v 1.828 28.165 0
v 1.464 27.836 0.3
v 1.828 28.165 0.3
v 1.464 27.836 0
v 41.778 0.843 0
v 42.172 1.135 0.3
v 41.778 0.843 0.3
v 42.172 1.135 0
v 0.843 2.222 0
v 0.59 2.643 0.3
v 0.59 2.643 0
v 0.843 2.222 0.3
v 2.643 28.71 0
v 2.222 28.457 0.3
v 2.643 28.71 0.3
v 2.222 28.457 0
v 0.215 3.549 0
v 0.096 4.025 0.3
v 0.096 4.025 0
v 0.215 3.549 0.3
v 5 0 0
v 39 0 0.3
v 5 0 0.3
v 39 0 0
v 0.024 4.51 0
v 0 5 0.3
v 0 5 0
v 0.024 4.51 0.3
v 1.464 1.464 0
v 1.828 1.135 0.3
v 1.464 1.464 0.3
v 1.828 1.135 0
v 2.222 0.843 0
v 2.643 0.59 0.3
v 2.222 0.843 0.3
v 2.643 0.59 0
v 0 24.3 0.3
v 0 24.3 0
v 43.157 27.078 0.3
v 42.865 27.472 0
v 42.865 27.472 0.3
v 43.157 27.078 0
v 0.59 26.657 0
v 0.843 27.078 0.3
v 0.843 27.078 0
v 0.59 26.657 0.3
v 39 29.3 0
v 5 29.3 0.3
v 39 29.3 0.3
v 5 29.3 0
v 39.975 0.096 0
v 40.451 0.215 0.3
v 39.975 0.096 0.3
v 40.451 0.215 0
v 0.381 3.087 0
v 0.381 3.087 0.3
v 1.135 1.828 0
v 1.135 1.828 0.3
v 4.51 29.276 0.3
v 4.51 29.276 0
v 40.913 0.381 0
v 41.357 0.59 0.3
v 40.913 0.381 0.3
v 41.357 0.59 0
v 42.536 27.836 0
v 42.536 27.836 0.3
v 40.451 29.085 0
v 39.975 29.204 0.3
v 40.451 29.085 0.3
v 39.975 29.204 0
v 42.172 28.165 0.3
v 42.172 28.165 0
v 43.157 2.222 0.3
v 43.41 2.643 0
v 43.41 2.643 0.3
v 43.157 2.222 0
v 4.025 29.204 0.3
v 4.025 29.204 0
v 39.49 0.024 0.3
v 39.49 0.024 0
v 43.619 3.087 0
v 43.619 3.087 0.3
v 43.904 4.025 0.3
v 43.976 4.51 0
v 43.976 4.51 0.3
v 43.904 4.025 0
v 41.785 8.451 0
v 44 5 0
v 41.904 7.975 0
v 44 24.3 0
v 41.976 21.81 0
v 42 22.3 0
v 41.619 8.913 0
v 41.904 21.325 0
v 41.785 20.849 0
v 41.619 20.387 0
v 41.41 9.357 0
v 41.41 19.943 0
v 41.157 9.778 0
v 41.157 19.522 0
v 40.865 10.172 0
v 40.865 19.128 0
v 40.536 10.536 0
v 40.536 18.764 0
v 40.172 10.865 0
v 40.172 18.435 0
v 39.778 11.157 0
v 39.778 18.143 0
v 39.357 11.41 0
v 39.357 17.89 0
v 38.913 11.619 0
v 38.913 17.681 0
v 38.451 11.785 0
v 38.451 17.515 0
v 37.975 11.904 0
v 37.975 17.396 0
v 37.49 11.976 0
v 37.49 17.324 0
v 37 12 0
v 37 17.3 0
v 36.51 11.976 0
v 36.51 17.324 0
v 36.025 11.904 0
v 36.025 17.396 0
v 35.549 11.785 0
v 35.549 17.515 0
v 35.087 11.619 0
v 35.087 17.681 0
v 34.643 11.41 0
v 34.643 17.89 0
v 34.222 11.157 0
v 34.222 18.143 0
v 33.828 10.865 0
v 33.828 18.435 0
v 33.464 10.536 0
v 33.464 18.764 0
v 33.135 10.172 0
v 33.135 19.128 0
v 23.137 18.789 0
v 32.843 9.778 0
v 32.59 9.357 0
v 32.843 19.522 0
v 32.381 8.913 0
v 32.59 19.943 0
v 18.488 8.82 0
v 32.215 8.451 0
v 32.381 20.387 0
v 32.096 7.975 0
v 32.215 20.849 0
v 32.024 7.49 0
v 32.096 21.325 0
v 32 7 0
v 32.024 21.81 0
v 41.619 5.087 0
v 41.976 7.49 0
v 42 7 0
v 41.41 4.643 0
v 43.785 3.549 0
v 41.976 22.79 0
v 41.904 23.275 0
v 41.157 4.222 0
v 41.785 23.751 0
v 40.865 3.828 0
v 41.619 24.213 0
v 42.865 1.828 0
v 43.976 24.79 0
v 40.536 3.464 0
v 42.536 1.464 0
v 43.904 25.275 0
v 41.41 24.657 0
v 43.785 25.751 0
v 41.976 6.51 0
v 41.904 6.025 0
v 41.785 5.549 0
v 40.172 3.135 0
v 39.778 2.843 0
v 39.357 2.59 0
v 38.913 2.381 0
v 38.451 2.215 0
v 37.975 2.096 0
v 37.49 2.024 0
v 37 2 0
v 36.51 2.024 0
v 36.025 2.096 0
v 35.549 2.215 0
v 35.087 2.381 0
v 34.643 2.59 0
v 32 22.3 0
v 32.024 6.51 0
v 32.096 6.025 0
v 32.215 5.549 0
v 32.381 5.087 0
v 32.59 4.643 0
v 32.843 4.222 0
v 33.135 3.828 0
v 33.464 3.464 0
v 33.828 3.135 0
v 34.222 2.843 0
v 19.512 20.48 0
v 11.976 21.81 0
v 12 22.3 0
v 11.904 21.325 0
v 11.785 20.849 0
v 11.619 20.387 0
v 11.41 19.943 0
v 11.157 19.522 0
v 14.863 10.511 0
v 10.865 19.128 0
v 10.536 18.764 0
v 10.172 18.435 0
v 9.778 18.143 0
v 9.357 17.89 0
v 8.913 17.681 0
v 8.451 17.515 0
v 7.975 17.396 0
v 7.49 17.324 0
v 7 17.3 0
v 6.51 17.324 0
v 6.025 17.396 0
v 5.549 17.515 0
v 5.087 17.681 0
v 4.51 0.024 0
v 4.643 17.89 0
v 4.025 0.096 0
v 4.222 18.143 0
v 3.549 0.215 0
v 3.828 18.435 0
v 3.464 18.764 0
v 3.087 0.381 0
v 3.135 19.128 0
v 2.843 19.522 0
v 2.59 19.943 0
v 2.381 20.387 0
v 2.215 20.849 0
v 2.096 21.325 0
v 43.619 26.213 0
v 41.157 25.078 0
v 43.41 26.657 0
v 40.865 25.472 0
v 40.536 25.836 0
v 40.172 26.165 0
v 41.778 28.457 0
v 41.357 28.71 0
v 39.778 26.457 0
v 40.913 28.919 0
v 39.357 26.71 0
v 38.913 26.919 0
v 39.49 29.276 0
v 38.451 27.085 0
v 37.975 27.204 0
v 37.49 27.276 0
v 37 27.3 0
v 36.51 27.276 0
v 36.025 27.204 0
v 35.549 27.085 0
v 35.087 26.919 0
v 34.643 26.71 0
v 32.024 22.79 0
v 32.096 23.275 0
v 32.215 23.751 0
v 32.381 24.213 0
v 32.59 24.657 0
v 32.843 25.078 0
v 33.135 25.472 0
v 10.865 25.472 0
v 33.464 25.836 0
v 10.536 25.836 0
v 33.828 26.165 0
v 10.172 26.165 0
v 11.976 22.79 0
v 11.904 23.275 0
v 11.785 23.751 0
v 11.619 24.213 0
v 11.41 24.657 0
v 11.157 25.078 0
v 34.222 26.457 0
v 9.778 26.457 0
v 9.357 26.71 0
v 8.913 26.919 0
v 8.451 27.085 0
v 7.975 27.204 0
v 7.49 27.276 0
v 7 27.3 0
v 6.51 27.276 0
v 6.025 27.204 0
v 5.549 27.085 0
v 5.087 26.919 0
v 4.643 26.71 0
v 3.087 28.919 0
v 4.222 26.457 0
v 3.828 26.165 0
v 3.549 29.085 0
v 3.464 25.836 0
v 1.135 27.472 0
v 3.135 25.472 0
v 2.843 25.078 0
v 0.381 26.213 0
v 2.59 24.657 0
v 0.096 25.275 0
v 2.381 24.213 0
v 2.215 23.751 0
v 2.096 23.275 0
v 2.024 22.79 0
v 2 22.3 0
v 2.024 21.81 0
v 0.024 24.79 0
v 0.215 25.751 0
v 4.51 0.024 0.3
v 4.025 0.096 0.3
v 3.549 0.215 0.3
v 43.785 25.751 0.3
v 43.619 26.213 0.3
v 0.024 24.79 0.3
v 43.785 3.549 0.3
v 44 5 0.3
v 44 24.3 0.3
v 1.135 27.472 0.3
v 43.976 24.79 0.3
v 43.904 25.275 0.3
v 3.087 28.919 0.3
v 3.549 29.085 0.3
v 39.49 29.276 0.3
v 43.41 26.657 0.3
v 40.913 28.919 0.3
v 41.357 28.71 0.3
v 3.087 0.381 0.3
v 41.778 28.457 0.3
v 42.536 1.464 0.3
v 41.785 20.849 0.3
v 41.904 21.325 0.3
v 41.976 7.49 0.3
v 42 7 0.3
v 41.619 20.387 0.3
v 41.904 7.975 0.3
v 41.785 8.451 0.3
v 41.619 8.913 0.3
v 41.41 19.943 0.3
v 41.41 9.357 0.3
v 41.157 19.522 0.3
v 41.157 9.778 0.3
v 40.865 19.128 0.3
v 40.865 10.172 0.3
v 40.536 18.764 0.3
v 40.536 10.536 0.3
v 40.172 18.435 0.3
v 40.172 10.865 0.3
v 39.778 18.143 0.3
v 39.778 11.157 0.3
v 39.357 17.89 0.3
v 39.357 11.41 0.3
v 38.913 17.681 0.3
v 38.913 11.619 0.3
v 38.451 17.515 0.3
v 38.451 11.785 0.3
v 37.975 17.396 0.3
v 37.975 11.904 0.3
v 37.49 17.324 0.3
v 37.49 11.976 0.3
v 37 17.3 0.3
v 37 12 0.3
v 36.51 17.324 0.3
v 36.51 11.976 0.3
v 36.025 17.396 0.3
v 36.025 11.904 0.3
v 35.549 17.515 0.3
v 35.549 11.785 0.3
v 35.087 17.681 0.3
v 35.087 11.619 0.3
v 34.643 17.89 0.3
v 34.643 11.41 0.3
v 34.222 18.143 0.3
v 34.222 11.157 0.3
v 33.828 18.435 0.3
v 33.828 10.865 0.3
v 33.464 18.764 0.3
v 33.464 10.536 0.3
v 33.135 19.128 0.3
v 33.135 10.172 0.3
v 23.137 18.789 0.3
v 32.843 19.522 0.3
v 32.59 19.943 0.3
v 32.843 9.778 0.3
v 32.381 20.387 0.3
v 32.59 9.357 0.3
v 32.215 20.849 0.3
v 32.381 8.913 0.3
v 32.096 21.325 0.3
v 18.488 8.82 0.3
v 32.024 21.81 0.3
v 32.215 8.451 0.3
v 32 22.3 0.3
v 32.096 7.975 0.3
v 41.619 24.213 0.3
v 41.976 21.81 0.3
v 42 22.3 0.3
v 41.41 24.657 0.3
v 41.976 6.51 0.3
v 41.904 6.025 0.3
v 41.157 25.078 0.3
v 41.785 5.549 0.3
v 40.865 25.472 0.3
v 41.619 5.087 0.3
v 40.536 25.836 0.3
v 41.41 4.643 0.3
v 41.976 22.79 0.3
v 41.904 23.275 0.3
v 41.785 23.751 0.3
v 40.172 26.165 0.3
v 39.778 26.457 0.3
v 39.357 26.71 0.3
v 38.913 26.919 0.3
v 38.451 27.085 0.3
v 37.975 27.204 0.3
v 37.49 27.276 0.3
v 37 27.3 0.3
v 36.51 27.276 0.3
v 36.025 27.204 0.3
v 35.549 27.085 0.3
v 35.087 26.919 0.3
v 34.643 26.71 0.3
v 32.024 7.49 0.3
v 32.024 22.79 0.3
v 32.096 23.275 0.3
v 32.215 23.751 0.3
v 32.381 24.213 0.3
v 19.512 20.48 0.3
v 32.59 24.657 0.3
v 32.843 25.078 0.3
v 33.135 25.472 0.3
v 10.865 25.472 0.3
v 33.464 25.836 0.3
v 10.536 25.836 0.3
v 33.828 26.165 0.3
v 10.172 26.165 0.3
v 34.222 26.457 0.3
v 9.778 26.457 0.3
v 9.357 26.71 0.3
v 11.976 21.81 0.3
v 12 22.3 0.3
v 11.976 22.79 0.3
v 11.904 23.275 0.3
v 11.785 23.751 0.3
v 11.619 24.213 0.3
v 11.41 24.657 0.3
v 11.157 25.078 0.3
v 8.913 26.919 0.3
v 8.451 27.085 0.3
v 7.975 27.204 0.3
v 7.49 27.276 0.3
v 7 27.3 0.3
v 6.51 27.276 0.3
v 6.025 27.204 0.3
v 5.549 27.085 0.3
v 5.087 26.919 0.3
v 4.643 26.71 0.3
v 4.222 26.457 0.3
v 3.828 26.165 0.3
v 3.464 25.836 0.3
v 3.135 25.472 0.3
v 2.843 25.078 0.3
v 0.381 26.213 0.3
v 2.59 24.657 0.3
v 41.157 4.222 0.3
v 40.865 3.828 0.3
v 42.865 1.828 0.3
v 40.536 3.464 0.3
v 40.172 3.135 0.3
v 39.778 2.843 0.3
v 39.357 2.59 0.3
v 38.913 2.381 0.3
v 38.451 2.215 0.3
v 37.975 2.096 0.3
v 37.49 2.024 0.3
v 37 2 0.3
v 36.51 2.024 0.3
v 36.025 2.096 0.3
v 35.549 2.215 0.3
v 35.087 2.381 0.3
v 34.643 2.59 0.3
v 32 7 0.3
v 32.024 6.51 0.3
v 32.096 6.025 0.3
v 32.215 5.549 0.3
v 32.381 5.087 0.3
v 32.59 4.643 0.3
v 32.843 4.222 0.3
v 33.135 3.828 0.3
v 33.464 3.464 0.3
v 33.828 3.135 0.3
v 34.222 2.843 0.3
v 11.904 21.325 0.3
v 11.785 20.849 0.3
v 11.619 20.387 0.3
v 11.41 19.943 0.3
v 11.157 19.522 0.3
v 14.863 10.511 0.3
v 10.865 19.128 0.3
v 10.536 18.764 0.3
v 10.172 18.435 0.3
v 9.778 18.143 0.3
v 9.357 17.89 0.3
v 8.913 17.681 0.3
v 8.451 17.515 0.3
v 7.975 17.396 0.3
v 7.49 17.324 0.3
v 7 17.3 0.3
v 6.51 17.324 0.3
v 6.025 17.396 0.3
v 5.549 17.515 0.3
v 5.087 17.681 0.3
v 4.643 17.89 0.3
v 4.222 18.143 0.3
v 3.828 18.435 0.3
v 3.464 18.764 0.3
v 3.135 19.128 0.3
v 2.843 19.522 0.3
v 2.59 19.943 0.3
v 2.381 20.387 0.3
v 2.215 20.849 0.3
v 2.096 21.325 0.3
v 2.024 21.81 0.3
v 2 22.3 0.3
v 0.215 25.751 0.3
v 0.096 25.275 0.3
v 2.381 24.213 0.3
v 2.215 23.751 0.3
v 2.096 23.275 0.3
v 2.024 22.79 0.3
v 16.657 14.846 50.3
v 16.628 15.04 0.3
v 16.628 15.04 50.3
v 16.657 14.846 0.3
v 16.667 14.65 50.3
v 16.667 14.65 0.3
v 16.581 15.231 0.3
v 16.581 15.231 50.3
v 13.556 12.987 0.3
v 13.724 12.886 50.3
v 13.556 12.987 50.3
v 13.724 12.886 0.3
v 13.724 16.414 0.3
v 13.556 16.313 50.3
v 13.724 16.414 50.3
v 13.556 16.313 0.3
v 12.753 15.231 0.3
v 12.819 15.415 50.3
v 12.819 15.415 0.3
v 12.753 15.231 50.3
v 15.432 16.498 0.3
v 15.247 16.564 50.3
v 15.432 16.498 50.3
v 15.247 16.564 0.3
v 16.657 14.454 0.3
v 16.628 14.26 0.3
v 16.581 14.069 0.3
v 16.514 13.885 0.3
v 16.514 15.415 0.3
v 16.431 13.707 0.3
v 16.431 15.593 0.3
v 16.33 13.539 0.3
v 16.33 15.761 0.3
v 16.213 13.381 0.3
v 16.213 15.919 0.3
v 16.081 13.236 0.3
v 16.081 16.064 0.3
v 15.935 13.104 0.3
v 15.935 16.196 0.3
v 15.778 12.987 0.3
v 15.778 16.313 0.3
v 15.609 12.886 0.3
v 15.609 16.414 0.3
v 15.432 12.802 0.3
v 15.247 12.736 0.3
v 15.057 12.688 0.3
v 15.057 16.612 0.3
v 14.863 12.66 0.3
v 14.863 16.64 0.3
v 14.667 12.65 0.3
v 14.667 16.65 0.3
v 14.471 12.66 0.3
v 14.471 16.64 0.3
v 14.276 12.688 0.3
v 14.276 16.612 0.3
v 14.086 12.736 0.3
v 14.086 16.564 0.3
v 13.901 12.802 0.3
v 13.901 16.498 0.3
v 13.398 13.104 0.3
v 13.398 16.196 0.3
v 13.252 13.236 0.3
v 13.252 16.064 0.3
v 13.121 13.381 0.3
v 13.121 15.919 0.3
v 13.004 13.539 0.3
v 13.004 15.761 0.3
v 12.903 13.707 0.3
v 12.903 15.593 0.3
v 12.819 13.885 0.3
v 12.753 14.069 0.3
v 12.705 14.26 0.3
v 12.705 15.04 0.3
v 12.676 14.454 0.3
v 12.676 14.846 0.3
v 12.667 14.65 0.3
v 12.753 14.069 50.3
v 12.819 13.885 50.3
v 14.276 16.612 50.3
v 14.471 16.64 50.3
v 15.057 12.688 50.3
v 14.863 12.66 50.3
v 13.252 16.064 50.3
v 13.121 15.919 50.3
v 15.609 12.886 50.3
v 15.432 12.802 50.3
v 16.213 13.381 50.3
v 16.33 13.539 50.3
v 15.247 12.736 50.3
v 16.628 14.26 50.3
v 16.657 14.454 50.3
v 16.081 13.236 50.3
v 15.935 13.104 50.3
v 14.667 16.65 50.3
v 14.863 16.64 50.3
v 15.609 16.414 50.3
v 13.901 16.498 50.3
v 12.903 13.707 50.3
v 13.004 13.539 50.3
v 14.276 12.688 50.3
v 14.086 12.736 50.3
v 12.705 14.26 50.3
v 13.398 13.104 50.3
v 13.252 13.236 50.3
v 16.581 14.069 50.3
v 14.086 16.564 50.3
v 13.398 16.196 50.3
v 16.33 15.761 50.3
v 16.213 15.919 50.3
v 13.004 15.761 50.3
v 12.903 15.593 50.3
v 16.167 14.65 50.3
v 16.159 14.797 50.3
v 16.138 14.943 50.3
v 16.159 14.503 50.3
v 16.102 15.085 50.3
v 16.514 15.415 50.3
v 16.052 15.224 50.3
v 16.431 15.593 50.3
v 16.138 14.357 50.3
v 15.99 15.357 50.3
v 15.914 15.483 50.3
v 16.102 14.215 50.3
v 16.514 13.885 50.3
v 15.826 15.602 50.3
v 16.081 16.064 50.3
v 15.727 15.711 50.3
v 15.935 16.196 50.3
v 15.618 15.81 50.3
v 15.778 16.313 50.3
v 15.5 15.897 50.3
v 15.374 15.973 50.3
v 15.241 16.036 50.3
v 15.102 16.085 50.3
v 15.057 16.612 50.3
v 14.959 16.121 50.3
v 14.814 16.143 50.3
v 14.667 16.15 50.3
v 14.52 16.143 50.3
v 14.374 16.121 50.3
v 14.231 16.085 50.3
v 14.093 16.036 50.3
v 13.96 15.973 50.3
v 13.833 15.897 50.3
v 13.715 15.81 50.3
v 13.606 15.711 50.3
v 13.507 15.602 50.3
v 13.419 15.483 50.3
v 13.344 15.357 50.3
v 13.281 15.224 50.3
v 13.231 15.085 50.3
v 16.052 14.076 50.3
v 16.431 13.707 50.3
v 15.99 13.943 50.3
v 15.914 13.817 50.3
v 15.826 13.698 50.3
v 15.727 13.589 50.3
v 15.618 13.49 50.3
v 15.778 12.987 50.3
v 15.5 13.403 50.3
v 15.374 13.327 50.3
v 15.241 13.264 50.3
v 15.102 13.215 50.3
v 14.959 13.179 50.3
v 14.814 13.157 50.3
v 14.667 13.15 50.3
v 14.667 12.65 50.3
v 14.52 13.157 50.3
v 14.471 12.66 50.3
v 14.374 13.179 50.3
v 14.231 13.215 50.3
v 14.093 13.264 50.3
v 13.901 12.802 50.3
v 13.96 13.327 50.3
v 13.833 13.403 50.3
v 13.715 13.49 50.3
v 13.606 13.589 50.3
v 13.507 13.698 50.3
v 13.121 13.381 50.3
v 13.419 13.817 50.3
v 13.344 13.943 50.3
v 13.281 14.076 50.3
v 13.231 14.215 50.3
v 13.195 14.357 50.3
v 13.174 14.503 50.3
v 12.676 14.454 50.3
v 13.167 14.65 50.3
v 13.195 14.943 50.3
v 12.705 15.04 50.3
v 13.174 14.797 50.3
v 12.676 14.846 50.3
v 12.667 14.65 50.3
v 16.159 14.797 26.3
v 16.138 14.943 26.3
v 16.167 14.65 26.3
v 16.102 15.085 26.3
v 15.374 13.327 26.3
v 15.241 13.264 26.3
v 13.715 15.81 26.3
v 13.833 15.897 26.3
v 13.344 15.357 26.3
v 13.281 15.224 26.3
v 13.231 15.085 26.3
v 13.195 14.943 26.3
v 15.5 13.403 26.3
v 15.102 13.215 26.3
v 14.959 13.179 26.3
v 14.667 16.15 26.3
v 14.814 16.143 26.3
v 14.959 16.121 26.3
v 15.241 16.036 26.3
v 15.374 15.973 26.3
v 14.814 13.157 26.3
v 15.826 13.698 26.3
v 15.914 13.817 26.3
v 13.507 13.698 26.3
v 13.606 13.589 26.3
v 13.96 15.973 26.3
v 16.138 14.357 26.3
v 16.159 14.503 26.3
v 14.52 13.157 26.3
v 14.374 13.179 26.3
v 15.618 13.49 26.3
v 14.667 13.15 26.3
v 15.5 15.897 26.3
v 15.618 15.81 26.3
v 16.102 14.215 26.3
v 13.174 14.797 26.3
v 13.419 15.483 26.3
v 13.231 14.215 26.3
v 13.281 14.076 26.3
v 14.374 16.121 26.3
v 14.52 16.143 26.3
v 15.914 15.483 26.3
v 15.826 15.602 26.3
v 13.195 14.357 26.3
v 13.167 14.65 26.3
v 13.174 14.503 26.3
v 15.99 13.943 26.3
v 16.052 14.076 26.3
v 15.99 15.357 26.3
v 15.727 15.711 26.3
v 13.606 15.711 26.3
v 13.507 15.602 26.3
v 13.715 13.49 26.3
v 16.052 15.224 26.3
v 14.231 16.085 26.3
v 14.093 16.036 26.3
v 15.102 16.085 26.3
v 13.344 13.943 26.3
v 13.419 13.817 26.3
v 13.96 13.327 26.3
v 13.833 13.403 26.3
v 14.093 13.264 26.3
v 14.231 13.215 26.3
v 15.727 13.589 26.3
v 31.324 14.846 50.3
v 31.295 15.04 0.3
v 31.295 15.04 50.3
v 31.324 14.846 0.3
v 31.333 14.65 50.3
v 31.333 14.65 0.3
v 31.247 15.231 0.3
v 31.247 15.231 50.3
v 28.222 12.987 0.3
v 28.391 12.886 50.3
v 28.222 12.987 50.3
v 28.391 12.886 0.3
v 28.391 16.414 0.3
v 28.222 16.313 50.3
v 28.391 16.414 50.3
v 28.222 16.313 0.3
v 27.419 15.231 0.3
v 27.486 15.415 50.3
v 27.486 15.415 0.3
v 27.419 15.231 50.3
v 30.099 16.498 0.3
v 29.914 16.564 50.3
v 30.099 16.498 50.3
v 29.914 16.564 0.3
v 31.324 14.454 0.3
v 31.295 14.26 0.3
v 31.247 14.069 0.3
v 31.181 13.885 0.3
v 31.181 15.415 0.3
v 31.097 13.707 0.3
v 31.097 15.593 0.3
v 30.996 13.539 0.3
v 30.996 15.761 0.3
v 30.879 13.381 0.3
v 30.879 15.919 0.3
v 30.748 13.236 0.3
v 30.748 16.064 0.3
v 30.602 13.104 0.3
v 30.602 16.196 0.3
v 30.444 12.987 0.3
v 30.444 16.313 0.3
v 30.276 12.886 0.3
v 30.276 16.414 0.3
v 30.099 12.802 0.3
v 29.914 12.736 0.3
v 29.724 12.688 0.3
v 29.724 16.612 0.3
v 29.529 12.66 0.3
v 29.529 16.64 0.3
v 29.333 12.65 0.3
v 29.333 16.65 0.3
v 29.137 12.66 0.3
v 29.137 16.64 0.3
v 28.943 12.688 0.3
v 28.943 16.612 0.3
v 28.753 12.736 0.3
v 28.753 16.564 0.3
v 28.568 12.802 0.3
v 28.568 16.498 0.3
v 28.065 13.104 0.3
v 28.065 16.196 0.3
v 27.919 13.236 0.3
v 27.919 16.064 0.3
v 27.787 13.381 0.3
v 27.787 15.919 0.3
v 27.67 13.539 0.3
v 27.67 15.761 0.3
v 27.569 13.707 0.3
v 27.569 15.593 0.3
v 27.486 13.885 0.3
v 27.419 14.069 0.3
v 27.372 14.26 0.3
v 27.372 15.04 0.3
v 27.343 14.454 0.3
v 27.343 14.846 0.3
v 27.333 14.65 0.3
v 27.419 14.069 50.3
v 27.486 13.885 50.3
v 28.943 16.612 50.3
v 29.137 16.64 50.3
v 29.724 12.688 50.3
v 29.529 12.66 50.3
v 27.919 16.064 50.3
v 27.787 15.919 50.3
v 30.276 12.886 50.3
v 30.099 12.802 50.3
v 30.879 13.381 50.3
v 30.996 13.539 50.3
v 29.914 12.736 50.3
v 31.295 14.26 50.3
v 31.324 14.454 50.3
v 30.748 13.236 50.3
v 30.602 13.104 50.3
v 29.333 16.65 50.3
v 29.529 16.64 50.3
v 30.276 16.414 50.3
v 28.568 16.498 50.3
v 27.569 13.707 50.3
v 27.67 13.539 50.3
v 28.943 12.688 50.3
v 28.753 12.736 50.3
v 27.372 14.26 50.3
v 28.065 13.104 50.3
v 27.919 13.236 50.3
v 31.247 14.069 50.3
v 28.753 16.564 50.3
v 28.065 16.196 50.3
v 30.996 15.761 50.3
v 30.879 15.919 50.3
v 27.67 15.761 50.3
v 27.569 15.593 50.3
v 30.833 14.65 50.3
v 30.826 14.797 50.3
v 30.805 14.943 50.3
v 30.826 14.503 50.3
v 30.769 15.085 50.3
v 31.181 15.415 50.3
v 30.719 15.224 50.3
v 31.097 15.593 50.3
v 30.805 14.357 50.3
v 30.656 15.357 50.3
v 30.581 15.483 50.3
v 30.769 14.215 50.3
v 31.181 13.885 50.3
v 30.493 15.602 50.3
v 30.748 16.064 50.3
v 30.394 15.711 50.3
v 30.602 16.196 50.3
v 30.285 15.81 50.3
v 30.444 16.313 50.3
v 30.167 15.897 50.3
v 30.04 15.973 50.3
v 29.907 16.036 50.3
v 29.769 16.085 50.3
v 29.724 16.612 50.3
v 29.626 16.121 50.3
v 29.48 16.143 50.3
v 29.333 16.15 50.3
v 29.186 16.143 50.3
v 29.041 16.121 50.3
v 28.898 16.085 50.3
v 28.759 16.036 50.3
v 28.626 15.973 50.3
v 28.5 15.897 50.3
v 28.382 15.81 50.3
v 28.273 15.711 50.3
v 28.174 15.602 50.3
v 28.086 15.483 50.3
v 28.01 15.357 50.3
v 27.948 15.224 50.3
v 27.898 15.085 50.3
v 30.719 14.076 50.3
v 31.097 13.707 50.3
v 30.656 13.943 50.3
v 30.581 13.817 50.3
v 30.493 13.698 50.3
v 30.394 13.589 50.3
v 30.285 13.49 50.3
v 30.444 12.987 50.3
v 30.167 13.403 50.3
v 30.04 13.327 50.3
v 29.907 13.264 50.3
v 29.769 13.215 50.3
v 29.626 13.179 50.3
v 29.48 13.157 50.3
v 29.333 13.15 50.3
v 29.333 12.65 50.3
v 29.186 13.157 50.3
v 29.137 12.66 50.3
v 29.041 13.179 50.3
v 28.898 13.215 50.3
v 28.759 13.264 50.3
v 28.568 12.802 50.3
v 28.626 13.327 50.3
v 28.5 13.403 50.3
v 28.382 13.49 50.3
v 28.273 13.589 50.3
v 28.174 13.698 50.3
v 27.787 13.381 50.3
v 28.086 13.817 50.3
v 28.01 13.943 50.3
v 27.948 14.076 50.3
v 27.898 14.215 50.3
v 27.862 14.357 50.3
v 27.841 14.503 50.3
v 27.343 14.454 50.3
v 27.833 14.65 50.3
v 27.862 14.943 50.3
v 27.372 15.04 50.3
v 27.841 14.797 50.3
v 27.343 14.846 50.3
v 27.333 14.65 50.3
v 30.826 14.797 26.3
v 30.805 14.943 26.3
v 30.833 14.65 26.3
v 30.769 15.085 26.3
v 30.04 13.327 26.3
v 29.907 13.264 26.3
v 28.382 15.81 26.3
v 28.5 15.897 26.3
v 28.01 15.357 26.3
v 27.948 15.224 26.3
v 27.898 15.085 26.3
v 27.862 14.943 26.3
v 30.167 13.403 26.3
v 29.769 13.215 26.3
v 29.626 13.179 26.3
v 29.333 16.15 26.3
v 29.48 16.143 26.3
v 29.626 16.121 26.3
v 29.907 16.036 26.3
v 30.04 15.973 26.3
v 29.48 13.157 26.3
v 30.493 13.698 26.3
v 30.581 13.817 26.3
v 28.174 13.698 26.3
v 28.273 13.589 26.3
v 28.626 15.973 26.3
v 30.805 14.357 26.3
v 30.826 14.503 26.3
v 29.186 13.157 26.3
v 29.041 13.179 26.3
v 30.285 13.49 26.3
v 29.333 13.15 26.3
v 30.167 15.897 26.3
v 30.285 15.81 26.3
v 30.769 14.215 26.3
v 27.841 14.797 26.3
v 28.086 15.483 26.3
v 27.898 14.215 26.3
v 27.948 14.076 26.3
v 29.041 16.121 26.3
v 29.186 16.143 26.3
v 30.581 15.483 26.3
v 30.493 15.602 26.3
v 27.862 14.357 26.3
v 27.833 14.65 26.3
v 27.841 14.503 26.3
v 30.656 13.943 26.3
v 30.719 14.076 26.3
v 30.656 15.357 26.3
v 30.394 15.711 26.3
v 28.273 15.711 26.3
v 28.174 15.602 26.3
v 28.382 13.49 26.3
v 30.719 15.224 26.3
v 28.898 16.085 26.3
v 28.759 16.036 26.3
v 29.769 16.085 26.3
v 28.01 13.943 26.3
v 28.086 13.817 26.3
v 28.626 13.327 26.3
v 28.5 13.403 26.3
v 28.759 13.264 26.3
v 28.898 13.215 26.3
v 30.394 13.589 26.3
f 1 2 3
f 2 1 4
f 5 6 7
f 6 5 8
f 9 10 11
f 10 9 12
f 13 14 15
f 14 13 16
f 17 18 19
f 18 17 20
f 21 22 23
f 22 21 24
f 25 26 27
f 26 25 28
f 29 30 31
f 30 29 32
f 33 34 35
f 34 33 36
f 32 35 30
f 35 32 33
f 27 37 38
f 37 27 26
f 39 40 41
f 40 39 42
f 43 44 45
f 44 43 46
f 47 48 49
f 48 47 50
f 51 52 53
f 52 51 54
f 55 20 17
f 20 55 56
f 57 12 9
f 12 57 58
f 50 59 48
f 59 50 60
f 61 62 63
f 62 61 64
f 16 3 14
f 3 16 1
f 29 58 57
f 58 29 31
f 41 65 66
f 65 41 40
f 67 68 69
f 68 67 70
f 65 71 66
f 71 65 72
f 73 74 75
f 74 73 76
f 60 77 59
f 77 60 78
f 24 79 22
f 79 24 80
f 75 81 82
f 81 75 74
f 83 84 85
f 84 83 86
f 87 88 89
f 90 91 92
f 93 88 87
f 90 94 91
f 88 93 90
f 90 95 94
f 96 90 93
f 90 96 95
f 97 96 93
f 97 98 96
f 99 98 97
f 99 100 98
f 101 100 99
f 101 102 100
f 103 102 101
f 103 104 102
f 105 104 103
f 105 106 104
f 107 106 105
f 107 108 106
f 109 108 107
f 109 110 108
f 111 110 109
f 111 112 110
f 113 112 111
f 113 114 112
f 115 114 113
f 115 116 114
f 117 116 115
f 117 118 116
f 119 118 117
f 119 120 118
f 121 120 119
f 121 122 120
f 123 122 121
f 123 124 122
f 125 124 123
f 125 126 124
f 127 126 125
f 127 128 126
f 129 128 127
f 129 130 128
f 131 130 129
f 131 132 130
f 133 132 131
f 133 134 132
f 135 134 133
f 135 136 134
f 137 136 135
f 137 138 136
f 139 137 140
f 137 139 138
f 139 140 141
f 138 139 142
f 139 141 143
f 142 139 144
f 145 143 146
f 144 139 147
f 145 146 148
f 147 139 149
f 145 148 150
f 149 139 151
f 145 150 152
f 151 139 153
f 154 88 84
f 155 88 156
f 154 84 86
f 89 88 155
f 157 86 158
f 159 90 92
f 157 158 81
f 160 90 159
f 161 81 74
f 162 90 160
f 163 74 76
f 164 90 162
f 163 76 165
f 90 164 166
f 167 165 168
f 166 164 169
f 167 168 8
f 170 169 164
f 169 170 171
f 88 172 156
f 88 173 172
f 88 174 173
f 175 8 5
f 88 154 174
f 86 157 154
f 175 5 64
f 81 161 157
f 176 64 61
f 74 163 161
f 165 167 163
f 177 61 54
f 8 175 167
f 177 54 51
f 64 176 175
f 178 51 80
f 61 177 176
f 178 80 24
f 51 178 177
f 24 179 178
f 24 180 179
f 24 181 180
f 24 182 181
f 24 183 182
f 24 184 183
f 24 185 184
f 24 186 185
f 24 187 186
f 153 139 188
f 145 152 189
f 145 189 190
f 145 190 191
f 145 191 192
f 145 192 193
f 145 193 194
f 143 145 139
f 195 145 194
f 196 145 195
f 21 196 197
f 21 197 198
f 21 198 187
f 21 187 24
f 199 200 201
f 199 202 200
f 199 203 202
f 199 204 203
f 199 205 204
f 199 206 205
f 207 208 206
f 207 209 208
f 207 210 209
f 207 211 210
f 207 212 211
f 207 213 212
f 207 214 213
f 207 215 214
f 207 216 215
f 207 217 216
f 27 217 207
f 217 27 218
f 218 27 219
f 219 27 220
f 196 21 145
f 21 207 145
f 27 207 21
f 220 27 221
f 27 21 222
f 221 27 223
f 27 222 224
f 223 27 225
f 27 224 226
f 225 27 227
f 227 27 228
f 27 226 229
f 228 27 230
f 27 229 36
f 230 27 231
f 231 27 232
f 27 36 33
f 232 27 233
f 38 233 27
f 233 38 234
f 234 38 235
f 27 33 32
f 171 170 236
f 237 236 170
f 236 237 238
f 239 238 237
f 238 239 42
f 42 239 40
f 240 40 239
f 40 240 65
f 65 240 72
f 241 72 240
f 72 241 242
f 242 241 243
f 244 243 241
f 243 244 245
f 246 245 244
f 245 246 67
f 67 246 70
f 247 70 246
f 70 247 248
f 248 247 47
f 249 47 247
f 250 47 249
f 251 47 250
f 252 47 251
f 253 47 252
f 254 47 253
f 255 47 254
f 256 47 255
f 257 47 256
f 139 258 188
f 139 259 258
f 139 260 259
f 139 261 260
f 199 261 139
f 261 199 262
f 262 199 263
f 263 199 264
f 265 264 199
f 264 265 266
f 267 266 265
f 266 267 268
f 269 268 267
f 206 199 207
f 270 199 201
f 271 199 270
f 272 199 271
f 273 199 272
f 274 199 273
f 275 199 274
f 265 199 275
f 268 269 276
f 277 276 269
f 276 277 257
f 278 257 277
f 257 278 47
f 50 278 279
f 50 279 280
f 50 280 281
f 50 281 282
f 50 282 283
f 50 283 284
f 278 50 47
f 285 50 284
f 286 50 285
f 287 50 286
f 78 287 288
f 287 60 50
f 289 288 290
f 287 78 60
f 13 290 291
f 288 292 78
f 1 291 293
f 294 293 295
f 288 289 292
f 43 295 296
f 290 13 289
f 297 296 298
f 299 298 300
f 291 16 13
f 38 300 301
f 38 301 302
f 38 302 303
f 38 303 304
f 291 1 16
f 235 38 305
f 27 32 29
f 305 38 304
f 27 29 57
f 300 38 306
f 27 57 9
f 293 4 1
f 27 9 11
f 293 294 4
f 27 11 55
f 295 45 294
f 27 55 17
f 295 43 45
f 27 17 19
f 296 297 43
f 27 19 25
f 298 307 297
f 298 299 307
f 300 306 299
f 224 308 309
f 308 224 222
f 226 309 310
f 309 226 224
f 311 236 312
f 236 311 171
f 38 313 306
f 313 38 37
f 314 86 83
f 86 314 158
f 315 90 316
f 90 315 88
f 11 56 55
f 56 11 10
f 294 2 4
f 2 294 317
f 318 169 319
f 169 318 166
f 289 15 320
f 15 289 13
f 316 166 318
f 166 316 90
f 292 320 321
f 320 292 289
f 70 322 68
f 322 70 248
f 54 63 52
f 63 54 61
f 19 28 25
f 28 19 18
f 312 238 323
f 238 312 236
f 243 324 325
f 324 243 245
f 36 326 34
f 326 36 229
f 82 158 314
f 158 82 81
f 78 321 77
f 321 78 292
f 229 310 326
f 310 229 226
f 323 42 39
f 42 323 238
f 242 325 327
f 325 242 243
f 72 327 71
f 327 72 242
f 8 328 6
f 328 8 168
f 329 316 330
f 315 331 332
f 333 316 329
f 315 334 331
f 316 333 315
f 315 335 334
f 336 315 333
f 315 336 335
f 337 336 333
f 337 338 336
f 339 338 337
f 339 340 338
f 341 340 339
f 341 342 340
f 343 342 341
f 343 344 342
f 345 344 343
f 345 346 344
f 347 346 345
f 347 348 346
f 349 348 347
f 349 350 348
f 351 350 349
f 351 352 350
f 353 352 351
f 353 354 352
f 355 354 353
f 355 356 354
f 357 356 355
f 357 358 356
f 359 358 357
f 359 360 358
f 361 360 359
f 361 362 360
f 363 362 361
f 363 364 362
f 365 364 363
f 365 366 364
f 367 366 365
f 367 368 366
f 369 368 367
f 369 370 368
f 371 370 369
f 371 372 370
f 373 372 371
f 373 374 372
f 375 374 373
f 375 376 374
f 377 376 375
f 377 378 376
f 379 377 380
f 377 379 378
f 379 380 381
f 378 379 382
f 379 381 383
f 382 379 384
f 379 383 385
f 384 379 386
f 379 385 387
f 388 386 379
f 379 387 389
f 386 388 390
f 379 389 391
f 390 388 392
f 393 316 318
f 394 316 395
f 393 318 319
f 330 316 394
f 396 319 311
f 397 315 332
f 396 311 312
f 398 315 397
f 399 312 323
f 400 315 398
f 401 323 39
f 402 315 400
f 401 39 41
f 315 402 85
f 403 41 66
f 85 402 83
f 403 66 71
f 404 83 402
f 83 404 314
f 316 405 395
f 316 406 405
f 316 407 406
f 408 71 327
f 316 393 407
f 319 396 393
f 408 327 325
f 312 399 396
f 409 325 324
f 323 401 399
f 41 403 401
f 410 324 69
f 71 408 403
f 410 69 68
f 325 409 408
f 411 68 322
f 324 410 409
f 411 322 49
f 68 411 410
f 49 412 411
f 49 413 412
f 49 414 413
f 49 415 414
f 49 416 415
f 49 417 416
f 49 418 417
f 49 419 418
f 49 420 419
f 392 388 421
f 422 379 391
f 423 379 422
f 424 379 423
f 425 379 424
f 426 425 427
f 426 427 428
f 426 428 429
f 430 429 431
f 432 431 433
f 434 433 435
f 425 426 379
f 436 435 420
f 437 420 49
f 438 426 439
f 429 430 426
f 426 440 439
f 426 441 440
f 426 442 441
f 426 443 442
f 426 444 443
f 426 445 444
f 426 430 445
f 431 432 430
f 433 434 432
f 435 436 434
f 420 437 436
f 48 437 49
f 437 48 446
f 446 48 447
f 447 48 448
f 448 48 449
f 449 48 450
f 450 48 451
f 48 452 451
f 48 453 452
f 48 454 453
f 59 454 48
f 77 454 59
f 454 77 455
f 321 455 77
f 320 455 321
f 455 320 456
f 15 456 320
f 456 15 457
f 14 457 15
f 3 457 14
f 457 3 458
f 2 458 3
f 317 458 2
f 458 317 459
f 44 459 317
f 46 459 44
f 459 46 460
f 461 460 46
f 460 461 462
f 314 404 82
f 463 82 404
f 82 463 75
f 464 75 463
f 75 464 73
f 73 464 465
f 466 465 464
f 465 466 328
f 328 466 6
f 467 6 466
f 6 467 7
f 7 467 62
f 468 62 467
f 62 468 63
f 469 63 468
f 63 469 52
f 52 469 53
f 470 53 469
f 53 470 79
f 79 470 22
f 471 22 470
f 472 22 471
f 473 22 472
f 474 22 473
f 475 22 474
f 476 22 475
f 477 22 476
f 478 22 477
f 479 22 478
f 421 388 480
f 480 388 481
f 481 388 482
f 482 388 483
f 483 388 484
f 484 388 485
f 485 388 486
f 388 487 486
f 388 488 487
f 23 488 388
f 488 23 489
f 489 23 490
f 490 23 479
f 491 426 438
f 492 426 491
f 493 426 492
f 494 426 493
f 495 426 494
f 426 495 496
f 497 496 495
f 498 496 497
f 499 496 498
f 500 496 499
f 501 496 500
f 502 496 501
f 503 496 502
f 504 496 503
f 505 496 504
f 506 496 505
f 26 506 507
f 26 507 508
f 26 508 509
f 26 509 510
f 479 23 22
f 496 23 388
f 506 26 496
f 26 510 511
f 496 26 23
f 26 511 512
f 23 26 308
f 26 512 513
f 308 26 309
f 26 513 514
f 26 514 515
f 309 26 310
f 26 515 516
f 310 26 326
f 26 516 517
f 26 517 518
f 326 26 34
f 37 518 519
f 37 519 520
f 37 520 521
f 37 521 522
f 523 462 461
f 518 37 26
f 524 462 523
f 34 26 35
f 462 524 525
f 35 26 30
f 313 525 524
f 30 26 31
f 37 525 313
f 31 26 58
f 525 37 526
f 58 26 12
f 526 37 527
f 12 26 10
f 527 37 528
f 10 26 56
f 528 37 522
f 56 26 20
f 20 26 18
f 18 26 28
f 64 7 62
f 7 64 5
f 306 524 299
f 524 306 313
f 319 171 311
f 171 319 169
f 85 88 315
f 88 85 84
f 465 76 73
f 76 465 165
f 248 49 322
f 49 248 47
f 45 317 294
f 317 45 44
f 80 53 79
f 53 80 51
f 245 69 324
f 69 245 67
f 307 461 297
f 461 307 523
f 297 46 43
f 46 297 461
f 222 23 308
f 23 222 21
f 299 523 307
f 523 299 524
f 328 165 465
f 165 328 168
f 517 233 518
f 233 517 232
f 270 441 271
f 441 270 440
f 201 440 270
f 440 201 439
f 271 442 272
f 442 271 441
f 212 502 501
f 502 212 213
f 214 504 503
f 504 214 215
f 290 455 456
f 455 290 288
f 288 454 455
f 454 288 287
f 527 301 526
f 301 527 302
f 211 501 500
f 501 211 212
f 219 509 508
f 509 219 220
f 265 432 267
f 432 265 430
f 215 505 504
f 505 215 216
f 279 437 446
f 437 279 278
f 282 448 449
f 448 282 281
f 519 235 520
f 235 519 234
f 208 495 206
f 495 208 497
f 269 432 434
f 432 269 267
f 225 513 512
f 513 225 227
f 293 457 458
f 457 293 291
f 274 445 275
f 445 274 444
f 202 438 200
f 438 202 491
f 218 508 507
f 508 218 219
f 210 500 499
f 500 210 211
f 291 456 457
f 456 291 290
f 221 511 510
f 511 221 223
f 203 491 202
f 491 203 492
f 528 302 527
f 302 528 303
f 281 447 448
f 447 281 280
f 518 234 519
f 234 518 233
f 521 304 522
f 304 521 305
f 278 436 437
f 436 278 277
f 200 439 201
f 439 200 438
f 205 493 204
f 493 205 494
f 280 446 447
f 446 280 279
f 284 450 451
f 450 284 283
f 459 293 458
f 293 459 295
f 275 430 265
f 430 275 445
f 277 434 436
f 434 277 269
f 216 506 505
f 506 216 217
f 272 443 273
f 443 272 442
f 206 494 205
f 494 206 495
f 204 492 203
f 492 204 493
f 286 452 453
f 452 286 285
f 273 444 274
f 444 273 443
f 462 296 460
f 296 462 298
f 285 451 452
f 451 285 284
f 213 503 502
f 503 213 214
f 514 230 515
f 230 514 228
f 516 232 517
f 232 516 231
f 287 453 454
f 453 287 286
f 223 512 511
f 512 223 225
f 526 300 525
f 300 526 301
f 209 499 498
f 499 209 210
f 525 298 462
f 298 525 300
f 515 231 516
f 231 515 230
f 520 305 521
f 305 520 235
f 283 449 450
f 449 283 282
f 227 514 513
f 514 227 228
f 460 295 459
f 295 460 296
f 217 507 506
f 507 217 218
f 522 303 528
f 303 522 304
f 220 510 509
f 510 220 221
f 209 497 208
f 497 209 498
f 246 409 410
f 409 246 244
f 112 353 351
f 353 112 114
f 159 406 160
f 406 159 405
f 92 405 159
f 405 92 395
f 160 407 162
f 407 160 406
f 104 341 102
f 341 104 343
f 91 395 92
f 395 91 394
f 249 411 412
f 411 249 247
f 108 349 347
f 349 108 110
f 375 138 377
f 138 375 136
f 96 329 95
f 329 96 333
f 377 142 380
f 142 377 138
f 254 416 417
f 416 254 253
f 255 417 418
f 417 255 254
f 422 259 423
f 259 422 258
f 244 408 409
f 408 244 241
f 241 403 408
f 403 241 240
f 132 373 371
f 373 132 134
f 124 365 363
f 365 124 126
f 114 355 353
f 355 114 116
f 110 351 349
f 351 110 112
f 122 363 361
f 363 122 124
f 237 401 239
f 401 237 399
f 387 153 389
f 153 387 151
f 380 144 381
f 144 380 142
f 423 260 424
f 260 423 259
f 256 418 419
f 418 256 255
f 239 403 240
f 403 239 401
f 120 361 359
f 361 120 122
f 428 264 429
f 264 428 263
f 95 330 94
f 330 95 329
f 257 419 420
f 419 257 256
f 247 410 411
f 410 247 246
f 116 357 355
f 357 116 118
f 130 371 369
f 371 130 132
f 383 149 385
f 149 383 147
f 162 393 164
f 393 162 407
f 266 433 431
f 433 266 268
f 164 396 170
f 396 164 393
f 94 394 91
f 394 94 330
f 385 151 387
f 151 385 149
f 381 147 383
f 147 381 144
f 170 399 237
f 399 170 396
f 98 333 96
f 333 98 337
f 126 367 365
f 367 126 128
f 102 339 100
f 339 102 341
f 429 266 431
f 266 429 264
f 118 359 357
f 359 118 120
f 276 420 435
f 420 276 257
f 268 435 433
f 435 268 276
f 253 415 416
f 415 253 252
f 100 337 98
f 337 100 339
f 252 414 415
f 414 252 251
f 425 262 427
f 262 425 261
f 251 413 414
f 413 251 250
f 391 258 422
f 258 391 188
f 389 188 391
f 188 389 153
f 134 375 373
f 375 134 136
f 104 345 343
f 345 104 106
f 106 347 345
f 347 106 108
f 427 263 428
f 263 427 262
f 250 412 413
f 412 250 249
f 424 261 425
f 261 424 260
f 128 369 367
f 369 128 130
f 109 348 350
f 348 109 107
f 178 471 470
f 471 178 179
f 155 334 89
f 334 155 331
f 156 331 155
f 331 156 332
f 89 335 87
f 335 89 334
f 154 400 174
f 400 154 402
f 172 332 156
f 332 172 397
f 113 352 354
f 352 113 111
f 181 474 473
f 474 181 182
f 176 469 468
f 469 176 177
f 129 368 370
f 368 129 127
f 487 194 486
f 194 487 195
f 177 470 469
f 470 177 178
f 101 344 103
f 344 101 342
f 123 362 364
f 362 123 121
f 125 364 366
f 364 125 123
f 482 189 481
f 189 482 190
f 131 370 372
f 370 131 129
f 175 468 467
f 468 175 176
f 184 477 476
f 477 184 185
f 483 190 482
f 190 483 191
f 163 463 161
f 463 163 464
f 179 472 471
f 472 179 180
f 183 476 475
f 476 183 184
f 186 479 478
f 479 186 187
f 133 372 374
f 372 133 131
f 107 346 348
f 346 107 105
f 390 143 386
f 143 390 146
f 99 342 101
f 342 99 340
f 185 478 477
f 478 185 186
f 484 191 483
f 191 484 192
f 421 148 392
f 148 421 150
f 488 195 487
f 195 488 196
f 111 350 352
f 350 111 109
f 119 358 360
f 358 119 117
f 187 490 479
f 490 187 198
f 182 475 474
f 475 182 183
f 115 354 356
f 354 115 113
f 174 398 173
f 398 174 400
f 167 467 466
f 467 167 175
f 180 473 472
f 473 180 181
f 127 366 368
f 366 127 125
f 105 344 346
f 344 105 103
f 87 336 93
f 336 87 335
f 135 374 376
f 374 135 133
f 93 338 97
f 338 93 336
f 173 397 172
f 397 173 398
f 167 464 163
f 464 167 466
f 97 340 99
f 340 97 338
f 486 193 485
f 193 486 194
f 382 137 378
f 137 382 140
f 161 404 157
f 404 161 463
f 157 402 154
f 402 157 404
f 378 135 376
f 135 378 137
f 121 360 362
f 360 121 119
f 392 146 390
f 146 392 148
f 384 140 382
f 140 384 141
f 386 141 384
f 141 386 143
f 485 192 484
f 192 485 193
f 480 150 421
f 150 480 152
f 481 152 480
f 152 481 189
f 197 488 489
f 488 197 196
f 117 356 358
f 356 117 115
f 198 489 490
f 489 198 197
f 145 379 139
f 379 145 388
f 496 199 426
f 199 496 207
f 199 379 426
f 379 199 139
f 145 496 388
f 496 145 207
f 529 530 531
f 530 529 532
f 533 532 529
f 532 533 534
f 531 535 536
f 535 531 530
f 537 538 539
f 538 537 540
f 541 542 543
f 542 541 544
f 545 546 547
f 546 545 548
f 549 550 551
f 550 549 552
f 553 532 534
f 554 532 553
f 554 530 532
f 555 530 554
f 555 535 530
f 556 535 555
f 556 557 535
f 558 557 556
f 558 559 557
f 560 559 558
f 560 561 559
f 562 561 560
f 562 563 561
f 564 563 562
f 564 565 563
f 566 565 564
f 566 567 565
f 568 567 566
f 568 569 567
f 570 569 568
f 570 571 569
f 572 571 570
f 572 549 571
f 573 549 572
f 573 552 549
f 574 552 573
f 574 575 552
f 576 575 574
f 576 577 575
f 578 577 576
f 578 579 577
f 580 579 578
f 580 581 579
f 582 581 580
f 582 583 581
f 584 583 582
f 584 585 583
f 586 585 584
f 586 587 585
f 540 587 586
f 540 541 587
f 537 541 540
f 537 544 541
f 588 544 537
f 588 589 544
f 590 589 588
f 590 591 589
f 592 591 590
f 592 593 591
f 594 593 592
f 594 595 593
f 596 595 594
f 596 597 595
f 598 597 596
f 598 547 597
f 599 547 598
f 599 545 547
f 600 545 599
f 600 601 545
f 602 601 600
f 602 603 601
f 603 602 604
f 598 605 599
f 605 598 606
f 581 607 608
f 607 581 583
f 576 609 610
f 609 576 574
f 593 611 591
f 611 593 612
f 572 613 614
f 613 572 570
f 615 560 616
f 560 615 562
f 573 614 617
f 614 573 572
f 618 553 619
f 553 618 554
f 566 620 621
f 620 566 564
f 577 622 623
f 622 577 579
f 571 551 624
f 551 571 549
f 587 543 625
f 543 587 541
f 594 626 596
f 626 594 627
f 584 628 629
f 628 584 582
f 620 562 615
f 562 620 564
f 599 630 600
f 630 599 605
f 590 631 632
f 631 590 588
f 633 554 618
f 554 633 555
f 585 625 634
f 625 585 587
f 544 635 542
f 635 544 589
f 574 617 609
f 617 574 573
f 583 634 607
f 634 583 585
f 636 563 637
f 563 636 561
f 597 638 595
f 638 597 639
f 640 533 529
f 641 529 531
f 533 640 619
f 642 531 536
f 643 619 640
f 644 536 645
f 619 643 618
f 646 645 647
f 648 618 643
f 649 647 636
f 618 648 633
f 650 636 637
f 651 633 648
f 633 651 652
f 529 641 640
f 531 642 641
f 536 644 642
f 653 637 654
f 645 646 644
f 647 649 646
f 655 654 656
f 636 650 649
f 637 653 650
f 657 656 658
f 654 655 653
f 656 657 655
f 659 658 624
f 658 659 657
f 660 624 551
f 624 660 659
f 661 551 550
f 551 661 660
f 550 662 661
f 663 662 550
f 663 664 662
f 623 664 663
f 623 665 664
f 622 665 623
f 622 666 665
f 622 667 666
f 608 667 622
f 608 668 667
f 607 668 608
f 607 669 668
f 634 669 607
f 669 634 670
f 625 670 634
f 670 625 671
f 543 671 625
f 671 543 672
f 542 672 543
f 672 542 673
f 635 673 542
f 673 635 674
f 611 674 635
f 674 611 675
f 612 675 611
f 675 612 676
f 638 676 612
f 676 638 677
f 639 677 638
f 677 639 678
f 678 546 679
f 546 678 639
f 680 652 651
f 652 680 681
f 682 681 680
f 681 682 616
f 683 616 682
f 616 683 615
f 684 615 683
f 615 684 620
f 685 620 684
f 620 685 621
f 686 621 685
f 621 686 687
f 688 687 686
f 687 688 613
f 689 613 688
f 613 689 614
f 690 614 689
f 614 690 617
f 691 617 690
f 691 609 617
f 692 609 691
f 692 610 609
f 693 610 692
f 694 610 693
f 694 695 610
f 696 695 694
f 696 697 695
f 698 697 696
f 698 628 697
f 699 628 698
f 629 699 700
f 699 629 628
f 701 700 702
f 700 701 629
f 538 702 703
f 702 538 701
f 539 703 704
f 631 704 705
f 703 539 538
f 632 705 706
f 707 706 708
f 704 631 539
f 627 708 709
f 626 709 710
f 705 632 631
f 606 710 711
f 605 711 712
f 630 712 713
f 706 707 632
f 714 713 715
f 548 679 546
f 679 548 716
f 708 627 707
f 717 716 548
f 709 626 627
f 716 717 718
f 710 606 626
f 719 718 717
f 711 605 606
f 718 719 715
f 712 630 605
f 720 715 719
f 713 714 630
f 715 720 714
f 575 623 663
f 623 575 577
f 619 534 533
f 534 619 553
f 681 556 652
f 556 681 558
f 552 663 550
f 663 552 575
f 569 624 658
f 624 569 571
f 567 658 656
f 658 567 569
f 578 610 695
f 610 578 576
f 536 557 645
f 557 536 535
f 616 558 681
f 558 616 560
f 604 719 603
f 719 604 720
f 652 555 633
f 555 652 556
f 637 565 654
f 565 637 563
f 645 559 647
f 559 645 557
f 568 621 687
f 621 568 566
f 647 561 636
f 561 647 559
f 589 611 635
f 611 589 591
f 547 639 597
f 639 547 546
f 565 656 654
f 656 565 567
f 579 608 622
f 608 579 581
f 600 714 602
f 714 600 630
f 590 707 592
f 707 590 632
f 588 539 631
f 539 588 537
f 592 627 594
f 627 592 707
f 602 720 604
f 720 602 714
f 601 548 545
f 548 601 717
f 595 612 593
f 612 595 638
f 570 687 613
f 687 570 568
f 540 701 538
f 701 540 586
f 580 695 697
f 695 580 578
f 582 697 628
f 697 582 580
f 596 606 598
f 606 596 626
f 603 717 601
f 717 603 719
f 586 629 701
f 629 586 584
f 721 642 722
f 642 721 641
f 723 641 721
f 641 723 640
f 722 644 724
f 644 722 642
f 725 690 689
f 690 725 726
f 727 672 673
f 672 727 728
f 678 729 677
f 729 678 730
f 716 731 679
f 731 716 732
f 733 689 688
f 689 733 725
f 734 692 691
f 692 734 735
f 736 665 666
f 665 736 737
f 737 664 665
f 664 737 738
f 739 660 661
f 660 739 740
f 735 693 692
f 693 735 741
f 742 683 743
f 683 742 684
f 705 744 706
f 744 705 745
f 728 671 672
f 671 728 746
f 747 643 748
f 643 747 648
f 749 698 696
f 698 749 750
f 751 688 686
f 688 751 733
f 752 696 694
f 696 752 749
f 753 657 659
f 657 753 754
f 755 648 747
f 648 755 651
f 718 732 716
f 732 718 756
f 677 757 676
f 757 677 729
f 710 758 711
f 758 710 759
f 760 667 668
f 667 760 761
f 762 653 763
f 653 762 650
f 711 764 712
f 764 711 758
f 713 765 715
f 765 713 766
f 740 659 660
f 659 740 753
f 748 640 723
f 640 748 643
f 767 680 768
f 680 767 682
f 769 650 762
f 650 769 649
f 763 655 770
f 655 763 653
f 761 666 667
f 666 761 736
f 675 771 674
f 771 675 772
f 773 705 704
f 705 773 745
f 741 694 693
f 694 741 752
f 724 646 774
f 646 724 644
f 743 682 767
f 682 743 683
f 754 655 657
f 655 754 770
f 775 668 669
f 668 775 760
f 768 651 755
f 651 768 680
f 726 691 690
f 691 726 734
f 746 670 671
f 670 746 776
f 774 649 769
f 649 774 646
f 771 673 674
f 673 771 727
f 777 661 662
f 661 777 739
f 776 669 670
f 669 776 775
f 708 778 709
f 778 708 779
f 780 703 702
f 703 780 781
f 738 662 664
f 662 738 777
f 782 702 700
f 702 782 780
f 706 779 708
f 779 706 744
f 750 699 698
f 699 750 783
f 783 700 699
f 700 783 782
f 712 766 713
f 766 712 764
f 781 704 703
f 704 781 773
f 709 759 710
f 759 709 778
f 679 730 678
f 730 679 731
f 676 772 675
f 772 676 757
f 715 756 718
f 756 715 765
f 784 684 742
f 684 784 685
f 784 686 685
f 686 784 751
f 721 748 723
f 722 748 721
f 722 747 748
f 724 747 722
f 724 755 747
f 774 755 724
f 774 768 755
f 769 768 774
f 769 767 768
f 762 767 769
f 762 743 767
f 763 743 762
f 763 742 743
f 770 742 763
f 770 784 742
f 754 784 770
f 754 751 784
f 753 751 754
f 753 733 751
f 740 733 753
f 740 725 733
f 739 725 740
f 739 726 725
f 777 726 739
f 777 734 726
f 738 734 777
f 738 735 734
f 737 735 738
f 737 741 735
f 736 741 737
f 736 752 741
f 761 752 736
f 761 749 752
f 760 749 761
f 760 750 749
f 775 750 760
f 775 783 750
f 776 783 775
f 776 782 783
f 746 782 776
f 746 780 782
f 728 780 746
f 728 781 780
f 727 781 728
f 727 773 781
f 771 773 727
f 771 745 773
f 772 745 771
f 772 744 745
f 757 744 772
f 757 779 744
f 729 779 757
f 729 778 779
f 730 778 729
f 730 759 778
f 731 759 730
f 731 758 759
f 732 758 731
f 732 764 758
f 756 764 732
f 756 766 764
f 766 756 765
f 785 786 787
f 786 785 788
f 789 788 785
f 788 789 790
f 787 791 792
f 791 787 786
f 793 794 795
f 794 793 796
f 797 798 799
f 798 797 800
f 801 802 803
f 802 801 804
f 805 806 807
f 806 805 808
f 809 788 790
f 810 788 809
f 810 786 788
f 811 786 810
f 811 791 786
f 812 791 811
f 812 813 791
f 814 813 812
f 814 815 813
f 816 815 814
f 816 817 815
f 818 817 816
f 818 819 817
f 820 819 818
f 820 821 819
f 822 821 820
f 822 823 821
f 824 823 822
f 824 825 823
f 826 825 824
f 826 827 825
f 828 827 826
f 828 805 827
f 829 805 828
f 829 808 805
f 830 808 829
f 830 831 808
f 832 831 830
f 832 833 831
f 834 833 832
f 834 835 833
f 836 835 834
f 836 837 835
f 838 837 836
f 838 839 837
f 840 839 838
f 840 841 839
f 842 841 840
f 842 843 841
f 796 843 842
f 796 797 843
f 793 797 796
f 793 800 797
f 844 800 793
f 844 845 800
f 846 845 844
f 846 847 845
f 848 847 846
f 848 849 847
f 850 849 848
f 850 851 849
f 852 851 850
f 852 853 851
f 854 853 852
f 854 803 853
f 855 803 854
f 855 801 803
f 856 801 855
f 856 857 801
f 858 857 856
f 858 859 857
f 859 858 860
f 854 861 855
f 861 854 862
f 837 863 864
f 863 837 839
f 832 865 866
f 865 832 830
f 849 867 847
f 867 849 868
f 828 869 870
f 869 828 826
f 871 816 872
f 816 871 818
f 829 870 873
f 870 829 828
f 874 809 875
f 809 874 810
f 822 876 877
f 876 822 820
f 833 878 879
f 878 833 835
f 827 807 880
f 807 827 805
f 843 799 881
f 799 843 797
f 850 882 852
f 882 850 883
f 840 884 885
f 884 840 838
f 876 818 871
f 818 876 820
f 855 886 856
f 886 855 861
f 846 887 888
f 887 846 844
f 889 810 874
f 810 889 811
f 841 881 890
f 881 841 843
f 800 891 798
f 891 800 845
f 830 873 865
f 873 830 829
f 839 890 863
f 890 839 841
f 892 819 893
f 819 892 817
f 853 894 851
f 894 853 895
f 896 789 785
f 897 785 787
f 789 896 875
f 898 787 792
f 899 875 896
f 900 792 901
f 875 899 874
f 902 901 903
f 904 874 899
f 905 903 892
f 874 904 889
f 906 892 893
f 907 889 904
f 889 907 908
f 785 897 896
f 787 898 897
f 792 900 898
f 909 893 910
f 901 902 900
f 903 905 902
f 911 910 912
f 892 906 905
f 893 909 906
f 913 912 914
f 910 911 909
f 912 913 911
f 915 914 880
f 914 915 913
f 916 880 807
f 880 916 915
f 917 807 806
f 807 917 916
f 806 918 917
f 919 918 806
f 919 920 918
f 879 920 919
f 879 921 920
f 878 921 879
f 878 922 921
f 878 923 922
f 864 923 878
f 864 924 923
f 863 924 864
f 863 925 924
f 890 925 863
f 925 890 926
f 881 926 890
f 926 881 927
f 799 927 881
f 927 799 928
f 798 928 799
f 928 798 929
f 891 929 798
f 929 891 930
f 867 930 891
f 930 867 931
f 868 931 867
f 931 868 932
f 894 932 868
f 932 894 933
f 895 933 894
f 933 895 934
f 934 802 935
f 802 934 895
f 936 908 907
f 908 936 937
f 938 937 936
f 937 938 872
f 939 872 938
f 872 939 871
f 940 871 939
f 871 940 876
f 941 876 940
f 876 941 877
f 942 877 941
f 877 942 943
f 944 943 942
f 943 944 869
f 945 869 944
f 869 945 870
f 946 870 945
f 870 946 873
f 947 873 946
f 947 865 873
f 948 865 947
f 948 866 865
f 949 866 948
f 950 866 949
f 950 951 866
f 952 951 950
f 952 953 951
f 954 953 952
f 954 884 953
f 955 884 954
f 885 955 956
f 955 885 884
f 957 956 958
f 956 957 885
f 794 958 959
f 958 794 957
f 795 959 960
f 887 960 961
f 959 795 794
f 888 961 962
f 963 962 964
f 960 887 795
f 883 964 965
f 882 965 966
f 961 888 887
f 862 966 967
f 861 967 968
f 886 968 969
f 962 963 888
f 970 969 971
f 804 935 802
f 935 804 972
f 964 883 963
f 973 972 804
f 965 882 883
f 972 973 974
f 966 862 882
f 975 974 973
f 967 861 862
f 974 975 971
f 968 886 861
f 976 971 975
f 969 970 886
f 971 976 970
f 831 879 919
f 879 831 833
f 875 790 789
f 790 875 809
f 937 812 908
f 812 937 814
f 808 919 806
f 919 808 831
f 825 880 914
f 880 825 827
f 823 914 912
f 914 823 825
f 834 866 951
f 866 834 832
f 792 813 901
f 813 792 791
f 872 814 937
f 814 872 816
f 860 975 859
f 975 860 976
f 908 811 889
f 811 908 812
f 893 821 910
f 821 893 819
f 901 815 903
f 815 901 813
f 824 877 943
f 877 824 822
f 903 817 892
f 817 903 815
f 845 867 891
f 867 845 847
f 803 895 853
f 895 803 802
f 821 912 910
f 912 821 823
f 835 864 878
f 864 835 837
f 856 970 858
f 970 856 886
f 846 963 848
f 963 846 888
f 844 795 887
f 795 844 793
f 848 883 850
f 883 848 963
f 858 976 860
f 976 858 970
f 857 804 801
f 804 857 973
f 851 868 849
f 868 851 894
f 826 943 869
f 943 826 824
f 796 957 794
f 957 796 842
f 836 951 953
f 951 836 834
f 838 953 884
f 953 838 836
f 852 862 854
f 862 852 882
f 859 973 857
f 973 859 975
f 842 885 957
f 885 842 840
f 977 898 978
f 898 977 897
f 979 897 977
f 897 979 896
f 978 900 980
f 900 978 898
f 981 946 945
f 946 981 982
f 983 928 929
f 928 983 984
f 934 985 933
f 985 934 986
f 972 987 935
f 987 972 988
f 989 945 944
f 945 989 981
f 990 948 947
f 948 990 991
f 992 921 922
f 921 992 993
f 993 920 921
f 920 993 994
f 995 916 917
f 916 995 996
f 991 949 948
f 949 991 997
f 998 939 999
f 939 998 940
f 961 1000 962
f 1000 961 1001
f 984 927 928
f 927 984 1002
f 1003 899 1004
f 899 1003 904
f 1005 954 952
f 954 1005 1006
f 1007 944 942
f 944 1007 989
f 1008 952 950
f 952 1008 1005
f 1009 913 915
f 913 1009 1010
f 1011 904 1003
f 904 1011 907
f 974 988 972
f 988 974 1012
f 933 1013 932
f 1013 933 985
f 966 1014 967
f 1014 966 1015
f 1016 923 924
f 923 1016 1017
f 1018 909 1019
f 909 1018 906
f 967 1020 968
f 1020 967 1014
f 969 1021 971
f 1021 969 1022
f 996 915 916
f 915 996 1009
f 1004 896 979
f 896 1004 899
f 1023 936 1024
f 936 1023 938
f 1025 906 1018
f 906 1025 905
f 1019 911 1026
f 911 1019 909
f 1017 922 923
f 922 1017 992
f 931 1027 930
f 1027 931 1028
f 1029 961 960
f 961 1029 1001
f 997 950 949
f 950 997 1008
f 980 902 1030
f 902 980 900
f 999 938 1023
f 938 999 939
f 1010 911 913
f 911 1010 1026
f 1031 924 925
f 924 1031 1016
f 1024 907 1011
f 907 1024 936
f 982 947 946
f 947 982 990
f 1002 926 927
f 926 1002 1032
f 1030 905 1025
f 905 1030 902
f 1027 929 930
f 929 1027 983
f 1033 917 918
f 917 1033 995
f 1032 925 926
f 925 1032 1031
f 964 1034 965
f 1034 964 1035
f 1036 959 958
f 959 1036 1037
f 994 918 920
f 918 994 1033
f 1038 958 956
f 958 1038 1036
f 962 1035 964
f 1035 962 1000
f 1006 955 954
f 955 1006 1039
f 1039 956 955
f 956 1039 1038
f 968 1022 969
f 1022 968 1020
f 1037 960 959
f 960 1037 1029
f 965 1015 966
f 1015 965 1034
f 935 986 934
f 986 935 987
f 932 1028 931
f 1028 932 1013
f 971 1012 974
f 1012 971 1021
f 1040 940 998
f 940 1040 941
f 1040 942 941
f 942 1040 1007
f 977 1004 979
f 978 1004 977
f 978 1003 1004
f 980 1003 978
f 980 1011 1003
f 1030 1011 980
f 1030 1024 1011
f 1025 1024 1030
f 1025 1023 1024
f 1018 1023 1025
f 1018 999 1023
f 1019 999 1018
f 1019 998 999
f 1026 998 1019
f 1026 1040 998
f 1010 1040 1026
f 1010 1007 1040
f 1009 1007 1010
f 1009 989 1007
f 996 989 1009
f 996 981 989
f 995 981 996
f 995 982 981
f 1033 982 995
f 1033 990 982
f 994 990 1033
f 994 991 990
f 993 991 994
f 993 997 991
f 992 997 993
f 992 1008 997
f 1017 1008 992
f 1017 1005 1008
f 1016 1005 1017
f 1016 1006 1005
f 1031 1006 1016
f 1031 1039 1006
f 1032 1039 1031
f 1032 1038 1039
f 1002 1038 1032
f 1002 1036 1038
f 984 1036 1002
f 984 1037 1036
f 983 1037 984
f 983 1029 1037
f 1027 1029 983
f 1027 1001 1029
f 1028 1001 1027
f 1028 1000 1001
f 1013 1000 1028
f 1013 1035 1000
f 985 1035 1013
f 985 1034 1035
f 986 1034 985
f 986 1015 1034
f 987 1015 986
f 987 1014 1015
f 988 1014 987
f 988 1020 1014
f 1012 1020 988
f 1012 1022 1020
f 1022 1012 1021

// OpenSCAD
$fn=64;
corner_radius=5;
plate_height=0.3;
plate_length=44;
plate_width=29.3;

contact_hole_radius=5;
contact_hole_distance=2;

locator_width=4;
locator_length=11;
locator_height=5;
locator_rotation=-25;
locator_distance=19;

translate([corner_radius,corner_radius,0]) difference() {
    union() {
        minkowski() {
            cube([plate_length-2 * corner_radius, plate_width-2 * corner_radius, plate_height/2]);
            cylinder(r=corner_radius, h=plate_height/2);
        }
        contact_hole_color(plate_length/2, contact_hole_distance + contact_hole_radius);
        contact_hole_color(plate_length/2, plate_width - contact_hole_distance - contact_hole_radius);
        contact_hole_color(contact_hole_distance + contact_hole_radius, contact_hole_distance + contact_hole_radius);
    }
    contact_hole(contact_hole_distance + contact_hole_radius, plate_width - contact_hole_distance - contact_hole_radius);
    contact_hole(plate_length - contact_hole_distance - contact_hole_radius, plate_width - contact_hole_distance - contact_hole_radius);
    contact_hole(plate_length - contact_hole_distance - contact_hole_radius, contact_hole_distance + contact_hole_radius);

    translate([locator_distance,plate_width/2,0])
    translate([-corner_radius,-corner_radius,0])
    rotate([0,0,locator_rotation])
    cube([locator_width,locator_length,locator_height], center=true);
}

module contact_hole(x, y) {
    translate([x - corner_radius, y - corner_radius, -1]) cylinder(h=2, r=contact_hole_radius);
}
module contact_hole_color(x, y, colorname="Lime") {
    translate([x - corner_radius, y - corner_radius, 0]) color(colorname, 1) cylinder(h=plate_height, r=contact_hole_radius);
}

module pillar(x) {
    translate([x, plate_width/2, plate_height]) difference() {
        cylinder(h=pillar_height, r=pillar_radius);
        translate([0,0,pillar_height/2+1]) cylinder(h=pillar_height/2, r=pillar_hole_radius);
    }
}

pillar_height=50;
pillar_radius=2;
pillar_hole_radius=1.5;
pillar(plate_length/3);
pillar(plate_length*2/3);
